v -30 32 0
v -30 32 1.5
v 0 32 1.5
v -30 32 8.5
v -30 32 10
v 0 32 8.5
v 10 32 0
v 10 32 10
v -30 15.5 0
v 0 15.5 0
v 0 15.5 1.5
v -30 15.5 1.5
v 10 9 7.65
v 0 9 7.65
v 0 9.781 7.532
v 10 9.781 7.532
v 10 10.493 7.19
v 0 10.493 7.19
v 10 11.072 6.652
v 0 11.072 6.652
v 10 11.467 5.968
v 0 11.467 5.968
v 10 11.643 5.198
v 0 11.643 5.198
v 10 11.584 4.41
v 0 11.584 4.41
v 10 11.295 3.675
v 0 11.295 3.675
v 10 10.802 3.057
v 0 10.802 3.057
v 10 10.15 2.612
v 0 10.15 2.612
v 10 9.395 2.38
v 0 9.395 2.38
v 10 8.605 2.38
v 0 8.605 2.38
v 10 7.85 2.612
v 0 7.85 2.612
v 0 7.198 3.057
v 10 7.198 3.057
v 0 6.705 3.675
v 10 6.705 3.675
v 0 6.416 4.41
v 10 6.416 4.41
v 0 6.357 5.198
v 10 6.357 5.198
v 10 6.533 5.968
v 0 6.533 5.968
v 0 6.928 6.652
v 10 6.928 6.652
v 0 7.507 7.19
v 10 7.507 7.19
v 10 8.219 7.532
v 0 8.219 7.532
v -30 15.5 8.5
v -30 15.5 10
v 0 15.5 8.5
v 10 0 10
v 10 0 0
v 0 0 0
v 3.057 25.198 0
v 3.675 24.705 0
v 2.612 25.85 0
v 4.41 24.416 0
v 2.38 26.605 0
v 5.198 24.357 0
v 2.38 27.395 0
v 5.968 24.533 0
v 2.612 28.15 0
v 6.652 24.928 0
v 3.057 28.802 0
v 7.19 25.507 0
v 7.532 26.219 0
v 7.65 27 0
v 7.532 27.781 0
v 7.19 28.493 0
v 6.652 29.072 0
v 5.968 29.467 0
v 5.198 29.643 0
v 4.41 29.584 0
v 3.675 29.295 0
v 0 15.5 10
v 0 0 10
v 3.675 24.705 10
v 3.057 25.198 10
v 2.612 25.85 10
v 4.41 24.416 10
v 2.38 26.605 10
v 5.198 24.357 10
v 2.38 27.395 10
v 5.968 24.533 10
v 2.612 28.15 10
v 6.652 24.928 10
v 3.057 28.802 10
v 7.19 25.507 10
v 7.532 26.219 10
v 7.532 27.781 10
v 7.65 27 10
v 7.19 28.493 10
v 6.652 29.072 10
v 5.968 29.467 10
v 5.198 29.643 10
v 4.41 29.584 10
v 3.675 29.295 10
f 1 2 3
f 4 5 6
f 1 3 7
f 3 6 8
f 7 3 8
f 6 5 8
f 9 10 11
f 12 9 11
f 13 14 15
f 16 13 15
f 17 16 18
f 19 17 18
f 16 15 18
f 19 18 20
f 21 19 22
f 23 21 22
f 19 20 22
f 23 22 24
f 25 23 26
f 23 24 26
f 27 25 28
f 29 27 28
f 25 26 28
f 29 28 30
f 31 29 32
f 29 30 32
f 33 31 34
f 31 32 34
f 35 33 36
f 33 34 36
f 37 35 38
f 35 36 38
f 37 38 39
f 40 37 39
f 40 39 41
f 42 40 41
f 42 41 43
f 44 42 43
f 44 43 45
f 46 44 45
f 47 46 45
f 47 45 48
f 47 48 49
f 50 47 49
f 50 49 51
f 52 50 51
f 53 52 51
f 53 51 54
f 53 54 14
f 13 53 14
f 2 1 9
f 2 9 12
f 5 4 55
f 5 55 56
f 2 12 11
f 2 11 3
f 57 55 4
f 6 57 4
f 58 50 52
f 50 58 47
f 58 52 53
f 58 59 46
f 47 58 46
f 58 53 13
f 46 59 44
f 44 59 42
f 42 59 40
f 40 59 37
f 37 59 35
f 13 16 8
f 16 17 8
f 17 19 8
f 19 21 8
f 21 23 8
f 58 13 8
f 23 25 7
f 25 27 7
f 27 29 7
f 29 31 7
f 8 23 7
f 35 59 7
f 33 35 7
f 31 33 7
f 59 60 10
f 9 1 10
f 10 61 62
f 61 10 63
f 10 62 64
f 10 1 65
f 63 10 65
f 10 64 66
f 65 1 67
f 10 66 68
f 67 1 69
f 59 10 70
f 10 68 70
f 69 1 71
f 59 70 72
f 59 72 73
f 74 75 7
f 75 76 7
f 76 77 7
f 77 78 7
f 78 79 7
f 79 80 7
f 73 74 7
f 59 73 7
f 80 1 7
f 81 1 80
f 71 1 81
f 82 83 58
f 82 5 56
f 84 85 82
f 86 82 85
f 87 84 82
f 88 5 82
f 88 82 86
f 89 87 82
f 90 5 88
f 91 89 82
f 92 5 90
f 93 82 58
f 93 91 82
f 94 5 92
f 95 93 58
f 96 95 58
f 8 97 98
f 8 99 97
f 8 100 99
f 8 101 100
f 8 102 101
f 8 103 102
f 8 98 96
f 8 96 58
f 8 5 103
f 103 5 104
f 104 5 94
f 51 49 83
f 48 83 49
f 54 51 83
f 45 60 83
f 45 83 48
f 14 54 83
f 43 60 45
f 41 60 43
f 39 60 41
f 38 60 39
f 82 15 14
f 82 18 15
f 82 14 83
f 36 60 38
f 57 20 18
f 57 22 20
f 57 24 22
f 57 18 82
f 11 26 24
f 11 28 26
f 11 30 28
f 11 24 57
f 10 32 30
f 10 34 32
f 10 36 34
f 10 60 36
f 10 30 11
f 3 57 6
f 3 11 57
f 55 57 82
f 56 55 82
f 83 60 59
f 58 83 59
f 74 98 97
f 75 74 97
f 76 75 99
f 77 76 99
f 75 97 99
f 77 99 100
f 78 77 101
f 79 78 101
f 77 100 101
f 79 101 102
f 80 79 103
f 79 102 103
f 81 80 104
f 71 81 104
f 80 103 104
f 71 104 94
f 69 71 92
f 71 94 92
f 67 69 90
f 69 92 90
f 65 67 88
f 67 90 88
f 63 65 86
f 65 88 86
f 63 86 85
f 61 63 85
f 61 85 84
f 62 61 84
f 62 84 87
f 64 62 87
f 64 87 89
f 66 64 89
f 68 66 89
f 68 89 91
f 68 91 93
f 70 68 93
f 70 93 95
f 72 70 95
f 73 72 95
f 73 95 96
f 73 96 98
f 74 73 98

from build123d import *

# Parameters (mm, degrees)
SKETCH2_W           = 10
SKETCH2_H           = 50
BOSS_EXTRUDE1_DEPTH = 10
SKETCH6_R           = 2.65
CUT_EXTRUDE3_DEPTH  = 11
SKETCH7_R           = 2.35
SKETCH7_R_2         = 2.65
CUT_EXTRUDE4_DEPTH  = 11
SKETCH8_W           = 1.5
SKETCH8_H           = 21
BOSS_EXTRUDE2_DEPTH = 30
SKETCH9_W           = 52.99414334
SKETCH9_H           = 19.059793282
CUT_EXTRUDE5_DEPTH  = 11


with BuildPart() as part:
    # Sketch2 → Boss-Extrude1 (new body)
    with BuildSketch(Plane.XY):
        with Locations((5, 25)):
            Rectangle(SKETCH2_W, SKETCH2_H)
    extrude(amount=BOSS_EXTRUDE1_DEPTH)

    # Sketch6 → Cut-Extrude3 (cut, through all)
    with BuildSketch(Plane.XY.offset(10)):
        with Locations((5, 27)):
            Circle(SKETCH6_R)
    extrude(amount=-CUT_EXTRUDE3_DEPTH, mode=Mode.SUBTRACT)

    # Sketch7 → Cut-Extrude4 (cut, through all)
    with BuildSketch(Plane.ZY):
        with Locations((5, 41)):
            Circle(SKETCH7_R)
        with Locations((5, 9)):
            Circle(SKETCH7_R_2)
    extrude(amount=-CUT_EXTRUDE4_DEPTH, mode=Mode.SUBTRACT)

    # Sketch8 → Boss-Extrude2 (add)
    with BuildSketch(Plane.ZY):
        with Locations((9.25, 26)):
            Rectangle(SKETCH8_W, SKETCH8_H)
        with Locations((0.75, 26)):
            Rectangle(SKETCH8_W, SKETCH8_H)
    extrude(amount=BOSS_EXTRUDE2_DEPTH)

    # Sketch9 → Cut-Extrude5 (cut, through all)
    with BuildSketch(Plane.XY.offset(10)):
        with Locations((-7.642110933, 41.529896641)):
            Rectangle(SKETCH9_W, SKETCH9_H)
    extrude(amount=-CUT_EXTRUDE5_DEPTH, mode=Mode.SUBTRACT)


solid = part.part
